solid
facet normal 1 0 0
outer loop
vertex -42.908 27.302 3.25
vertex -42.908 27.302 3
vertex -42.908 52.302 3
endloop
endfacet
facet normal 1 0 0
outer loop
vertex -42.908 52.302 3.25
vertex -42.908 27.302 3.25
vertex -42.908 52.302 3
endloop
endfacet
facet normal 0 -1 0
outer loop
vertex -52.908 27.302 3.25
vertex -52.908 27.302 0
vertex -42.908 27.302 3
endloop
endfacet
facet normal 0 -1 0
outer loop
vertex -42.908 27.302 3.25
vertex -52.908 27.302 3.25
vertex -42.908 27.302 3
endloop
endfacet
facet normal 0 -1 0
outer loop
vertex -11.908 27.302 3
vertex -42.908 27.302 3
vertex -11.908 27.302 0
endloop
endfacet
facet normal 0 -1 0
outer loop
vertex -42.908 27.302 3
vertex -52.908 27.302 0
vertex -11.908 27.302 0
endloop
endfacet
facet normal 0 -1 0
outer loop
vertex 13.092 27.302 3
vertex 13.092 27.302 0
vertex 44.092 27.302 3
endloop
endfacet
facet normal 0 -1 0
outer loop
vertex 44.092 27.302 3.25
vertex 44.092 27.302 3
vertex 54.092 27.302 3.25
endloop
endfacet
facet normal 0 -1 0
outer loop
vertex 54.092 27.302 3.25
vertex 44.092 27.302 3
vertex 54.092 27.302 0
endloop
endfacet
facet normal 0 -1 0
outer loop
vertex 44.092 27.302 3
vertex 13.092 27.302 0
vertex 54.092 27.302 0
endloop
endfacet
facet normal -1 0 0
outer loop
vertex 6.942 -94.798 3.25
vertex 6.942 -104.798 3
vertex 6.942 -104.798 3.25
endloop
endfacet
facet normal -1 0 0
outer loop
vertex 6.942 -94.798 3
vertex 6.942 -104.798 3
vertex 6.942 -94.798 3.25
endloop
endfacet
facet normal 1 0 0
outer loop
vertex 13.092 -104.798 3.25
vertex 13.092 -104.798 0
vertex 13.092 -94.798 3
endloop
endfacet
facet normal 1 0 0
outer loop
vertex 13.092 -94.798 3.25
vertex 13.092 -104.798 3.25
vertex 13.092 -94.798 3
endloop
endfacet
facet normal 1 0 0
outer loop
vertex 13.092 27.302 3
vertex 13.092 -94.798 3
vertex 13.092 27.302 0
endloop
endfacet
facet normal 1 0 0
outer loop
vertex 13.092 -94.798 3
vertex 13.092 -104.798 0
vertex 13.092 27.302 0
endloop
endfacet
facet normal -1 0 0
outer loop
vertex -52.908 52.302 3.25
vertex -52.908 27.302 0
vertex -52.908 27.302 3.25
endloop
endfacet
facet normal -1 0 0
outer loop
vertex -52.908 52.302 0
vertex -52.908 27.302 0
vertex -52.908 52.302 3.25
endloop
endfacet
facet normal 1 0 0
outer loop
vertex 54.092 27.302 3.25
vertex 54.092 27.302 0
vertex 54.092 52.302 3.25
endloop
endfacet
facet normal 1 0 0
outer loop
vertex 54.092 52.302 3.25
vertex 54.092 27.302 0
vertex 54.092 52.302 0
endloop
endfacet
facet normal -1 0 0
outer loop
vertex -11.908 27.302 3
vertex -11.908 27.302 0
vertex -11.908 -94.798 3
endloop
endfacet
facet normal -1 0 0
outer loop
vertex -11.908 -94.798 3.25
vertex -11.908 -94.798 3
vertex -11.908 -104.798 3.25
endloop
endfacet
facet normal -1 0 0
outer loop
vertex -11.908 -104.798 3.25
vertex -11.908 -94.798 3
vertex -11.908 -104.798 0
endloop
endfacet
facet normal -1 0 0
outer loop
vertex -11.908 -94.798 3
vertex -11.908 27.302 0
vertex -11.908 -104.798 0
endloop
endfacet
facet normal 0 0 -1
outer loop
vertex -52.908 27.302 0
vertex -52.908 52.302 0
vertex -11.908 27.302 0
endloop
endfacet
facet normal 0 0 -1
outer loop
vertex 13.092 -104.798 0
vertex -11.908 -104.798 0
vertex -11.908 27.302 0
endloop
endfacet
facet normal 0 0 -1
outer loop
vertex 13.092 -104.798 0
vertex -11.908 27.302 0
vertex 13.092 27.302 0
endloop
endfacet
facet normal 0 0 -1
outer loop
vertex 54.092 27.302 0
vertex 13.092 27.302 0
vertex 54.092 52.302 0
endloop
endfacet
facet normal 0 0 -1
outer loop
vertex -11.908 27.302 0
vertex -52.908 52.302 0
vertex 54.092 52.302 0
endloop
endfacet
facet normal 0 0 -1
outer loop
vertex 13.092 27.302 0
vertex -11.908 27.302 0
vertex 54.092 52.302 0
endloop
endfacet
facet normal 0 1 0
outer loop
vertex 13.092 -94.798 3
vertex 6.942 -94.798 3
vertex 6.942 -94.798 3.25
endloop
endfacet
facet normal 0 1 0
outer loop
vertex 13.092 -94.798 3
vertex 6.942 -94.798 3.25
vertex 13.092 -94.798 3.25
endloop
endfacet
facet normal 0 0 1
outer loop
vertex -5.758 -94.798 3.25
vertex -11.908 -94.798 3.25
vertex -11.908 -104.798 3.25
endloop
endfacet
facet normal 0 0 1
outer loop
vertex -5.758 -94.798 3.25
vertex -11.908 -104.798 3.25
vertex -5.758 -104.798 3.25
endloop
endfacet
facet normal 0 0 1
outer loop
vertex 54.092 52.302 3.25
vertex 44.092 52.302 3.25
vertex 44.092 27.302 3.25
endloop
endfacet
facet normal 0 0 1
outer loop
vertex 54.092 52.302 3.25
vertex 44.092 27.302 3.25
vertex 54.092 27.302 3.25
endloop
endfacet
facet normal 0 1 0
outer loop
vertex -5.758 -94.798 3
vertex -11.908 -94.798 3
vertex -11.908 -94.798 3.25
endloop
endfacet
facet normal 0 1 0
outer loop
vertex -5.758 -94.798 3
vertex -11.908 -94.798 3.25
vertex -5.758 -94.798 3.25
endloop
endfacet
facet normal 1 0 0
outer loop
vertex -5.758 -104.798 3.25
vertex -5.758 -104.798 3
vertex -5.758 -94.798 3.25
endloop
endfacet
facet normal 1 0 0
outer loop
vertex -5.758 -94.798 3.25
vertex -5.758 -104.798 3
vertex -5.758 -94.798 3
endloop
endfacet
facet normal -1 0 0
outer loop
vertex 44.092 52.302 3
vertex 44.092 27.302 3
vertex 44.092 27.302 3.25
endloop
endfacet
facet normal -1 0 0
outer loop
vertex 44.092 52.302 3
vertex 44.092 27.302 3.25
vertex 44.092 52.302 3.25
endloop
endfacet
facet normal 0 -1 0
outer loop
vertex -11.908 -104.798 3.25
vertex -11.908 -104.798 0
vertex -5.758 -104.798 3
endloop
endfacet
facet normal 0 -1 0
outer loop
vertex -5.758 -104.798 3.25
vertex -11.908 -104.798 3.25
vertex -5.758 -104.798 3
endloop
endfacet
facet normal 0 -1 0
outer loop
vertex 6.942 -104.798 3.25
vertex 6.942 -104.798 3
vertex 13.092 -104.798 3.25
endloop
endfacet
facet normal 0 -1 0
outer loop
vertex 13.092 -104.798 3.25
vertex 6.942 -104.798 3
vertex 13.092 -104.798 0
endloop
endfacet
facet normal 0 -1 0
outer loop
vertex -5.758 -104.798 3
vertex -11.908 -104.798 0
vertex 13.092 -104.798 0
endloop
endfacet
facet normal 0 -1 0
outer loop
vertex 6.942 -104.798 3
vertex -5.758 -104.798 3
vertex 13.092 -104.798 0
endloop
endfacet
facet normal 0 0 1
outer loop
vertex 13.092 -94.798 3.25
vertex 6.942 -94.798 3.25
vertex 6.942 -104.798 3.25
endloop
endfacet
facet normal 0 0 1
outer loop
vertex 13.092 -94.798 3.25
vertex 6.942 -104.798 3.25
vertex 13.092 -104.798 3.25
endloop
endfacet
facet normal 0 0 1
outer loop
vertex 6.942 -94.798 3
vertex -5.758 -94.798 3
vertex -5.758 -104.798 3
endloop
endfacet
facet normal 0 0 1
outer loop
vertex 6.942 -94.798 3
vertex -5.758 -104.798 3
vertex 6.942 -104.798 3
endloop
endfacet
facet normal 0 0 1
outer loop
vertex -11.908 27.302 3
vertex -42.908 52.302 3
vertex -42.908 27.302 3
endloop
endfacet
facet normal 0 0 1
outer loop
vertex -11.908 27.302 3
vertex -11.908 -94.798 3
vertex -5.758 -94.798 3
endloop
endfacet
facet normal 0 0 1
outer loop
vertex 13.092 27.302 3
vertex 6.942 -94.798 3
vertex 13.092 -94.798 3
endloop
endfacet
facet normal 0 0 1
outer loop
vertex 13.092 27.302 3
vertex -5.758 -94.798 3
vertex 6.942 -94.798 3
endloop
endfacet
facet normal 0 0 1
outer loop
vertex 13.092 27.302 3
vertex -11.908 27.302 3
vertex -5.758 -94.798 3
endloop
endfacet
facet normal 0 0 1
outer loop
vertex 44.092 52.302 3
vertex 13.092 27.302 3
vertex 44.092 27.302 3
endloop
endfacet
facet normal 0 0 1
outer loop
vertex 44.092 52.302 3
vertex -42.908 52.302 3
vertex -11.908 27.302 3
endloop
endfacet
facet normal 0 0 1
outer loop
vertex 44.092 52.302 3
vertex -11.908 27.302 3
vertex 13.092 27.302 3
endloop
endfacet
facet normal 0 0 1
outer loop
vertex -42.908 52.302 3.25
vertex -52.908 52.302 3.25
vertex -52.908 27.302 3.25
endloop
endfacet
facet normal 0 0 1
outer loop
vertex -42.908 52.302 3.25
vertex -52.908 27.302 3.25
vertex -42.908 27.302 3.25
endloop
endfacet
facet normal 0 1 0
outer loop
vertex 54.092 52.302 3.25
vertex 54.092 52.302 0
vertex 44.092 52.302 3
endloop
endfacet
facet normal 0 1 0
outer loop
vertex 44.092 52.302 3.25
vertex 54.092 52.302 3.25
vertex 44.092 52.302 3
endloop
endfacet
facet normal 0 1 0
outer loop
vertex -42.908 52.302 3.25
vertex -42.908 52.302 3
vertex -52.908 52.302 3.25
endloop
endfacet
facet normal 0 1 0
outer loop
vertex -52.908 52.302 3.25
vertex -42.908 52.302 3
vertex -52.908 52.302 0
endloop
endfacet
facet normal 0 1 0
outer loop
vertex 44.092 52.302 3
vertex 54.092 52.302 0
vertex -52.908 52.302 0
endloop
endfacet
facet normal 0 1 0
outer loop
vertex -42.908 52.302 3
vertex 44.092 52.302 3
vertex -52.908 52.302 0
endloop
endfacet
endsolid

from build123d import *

# Parameters (mm, degrees)
F0_W     = 6
F0_H     = 25
F0_W_2   = 5
F0_W_3   = 12.7
F0_H_2   = 10
F0_H_3   = 5
F0_W_4   = 6.15
F1_DEPTH = 3
F0_W_5   = 10
F2_DEPTH = 3.25


with BuildPart() as f1:
    # F0 (on Top) → F1 (new body)
    with BuildSketch(Plane.XY):
        with Locations((-39.9078816451, 39.8015151515)):
            Rectangle(F0_W, F0_H)
        Polygon((-11.9078816451, 27.3015151515), (0.5921183549, 27.3015151515), (0.5921183549, 52.3015151515), (-36.9078816451, 52.3015151515), (-36.9078816451, 27.3015151515), align=None)
        Polygon((0.5921183549, 27.3015151515), (13.0921183549, 27.3015151515), (39.0921183549, 27.3015151515), (39.0921183549, 52.3015151515), (0.5921183549, 52.3015151515), align=None)
        with Locations((41.5921183549, 39.8015151515)):
            Rectangle(F0_W_2, F0_H)
        with Locations((0.5921183549, -99.7984848485)):
            Rectangle(F0_W_3, F0_H_2)
        with Locations((0.5921183549, -92.2984848485)):
            Rectangle(F0_W_3, F0_H_3)
        with Locations((10.0171183549, -92.2984848485)):
            Rectangle(F0_W_4, F0_H_3)
        Polygon((6.9421183549, -89.7984848485), (13.0921183549, -89.7984848485), (13.0921183549, 27.3015151515), (0.5921183549, 27.3015151515), (-11.9078816451, 27.3015151515), (-11.9078816451, -89.7984848485), (-5.7578816451, -89.7984848485), align=None)
        with Locations((-8.8328816451, -92.2984848485)):
            Rectangle(F0_W_4, F0_H_3)
    extrude(amount=F1_DEPTH)

    # F0 (on Top) → F2 (join)
    with BuildSketch(Plane.XY):
        with Locations((10.0171183549, -99.7984848485)):
            Rectangle(F0_W_4, F0_H_2)
        with Locations((-8.8328816451, -99.7984848485)):
            Rectangle(F0_W_4, F0_H_2)
        with Locations((-47.9078816451, 39.8015151515)):
            Rectangle(F0_W_5, F0_H)
        with Locations((49.0921183549, 39.8015151515)):
            Rectangle(F0_W_5, F0_H)
    extrude(amount=F2_DEPTH)


solid = f1.part
